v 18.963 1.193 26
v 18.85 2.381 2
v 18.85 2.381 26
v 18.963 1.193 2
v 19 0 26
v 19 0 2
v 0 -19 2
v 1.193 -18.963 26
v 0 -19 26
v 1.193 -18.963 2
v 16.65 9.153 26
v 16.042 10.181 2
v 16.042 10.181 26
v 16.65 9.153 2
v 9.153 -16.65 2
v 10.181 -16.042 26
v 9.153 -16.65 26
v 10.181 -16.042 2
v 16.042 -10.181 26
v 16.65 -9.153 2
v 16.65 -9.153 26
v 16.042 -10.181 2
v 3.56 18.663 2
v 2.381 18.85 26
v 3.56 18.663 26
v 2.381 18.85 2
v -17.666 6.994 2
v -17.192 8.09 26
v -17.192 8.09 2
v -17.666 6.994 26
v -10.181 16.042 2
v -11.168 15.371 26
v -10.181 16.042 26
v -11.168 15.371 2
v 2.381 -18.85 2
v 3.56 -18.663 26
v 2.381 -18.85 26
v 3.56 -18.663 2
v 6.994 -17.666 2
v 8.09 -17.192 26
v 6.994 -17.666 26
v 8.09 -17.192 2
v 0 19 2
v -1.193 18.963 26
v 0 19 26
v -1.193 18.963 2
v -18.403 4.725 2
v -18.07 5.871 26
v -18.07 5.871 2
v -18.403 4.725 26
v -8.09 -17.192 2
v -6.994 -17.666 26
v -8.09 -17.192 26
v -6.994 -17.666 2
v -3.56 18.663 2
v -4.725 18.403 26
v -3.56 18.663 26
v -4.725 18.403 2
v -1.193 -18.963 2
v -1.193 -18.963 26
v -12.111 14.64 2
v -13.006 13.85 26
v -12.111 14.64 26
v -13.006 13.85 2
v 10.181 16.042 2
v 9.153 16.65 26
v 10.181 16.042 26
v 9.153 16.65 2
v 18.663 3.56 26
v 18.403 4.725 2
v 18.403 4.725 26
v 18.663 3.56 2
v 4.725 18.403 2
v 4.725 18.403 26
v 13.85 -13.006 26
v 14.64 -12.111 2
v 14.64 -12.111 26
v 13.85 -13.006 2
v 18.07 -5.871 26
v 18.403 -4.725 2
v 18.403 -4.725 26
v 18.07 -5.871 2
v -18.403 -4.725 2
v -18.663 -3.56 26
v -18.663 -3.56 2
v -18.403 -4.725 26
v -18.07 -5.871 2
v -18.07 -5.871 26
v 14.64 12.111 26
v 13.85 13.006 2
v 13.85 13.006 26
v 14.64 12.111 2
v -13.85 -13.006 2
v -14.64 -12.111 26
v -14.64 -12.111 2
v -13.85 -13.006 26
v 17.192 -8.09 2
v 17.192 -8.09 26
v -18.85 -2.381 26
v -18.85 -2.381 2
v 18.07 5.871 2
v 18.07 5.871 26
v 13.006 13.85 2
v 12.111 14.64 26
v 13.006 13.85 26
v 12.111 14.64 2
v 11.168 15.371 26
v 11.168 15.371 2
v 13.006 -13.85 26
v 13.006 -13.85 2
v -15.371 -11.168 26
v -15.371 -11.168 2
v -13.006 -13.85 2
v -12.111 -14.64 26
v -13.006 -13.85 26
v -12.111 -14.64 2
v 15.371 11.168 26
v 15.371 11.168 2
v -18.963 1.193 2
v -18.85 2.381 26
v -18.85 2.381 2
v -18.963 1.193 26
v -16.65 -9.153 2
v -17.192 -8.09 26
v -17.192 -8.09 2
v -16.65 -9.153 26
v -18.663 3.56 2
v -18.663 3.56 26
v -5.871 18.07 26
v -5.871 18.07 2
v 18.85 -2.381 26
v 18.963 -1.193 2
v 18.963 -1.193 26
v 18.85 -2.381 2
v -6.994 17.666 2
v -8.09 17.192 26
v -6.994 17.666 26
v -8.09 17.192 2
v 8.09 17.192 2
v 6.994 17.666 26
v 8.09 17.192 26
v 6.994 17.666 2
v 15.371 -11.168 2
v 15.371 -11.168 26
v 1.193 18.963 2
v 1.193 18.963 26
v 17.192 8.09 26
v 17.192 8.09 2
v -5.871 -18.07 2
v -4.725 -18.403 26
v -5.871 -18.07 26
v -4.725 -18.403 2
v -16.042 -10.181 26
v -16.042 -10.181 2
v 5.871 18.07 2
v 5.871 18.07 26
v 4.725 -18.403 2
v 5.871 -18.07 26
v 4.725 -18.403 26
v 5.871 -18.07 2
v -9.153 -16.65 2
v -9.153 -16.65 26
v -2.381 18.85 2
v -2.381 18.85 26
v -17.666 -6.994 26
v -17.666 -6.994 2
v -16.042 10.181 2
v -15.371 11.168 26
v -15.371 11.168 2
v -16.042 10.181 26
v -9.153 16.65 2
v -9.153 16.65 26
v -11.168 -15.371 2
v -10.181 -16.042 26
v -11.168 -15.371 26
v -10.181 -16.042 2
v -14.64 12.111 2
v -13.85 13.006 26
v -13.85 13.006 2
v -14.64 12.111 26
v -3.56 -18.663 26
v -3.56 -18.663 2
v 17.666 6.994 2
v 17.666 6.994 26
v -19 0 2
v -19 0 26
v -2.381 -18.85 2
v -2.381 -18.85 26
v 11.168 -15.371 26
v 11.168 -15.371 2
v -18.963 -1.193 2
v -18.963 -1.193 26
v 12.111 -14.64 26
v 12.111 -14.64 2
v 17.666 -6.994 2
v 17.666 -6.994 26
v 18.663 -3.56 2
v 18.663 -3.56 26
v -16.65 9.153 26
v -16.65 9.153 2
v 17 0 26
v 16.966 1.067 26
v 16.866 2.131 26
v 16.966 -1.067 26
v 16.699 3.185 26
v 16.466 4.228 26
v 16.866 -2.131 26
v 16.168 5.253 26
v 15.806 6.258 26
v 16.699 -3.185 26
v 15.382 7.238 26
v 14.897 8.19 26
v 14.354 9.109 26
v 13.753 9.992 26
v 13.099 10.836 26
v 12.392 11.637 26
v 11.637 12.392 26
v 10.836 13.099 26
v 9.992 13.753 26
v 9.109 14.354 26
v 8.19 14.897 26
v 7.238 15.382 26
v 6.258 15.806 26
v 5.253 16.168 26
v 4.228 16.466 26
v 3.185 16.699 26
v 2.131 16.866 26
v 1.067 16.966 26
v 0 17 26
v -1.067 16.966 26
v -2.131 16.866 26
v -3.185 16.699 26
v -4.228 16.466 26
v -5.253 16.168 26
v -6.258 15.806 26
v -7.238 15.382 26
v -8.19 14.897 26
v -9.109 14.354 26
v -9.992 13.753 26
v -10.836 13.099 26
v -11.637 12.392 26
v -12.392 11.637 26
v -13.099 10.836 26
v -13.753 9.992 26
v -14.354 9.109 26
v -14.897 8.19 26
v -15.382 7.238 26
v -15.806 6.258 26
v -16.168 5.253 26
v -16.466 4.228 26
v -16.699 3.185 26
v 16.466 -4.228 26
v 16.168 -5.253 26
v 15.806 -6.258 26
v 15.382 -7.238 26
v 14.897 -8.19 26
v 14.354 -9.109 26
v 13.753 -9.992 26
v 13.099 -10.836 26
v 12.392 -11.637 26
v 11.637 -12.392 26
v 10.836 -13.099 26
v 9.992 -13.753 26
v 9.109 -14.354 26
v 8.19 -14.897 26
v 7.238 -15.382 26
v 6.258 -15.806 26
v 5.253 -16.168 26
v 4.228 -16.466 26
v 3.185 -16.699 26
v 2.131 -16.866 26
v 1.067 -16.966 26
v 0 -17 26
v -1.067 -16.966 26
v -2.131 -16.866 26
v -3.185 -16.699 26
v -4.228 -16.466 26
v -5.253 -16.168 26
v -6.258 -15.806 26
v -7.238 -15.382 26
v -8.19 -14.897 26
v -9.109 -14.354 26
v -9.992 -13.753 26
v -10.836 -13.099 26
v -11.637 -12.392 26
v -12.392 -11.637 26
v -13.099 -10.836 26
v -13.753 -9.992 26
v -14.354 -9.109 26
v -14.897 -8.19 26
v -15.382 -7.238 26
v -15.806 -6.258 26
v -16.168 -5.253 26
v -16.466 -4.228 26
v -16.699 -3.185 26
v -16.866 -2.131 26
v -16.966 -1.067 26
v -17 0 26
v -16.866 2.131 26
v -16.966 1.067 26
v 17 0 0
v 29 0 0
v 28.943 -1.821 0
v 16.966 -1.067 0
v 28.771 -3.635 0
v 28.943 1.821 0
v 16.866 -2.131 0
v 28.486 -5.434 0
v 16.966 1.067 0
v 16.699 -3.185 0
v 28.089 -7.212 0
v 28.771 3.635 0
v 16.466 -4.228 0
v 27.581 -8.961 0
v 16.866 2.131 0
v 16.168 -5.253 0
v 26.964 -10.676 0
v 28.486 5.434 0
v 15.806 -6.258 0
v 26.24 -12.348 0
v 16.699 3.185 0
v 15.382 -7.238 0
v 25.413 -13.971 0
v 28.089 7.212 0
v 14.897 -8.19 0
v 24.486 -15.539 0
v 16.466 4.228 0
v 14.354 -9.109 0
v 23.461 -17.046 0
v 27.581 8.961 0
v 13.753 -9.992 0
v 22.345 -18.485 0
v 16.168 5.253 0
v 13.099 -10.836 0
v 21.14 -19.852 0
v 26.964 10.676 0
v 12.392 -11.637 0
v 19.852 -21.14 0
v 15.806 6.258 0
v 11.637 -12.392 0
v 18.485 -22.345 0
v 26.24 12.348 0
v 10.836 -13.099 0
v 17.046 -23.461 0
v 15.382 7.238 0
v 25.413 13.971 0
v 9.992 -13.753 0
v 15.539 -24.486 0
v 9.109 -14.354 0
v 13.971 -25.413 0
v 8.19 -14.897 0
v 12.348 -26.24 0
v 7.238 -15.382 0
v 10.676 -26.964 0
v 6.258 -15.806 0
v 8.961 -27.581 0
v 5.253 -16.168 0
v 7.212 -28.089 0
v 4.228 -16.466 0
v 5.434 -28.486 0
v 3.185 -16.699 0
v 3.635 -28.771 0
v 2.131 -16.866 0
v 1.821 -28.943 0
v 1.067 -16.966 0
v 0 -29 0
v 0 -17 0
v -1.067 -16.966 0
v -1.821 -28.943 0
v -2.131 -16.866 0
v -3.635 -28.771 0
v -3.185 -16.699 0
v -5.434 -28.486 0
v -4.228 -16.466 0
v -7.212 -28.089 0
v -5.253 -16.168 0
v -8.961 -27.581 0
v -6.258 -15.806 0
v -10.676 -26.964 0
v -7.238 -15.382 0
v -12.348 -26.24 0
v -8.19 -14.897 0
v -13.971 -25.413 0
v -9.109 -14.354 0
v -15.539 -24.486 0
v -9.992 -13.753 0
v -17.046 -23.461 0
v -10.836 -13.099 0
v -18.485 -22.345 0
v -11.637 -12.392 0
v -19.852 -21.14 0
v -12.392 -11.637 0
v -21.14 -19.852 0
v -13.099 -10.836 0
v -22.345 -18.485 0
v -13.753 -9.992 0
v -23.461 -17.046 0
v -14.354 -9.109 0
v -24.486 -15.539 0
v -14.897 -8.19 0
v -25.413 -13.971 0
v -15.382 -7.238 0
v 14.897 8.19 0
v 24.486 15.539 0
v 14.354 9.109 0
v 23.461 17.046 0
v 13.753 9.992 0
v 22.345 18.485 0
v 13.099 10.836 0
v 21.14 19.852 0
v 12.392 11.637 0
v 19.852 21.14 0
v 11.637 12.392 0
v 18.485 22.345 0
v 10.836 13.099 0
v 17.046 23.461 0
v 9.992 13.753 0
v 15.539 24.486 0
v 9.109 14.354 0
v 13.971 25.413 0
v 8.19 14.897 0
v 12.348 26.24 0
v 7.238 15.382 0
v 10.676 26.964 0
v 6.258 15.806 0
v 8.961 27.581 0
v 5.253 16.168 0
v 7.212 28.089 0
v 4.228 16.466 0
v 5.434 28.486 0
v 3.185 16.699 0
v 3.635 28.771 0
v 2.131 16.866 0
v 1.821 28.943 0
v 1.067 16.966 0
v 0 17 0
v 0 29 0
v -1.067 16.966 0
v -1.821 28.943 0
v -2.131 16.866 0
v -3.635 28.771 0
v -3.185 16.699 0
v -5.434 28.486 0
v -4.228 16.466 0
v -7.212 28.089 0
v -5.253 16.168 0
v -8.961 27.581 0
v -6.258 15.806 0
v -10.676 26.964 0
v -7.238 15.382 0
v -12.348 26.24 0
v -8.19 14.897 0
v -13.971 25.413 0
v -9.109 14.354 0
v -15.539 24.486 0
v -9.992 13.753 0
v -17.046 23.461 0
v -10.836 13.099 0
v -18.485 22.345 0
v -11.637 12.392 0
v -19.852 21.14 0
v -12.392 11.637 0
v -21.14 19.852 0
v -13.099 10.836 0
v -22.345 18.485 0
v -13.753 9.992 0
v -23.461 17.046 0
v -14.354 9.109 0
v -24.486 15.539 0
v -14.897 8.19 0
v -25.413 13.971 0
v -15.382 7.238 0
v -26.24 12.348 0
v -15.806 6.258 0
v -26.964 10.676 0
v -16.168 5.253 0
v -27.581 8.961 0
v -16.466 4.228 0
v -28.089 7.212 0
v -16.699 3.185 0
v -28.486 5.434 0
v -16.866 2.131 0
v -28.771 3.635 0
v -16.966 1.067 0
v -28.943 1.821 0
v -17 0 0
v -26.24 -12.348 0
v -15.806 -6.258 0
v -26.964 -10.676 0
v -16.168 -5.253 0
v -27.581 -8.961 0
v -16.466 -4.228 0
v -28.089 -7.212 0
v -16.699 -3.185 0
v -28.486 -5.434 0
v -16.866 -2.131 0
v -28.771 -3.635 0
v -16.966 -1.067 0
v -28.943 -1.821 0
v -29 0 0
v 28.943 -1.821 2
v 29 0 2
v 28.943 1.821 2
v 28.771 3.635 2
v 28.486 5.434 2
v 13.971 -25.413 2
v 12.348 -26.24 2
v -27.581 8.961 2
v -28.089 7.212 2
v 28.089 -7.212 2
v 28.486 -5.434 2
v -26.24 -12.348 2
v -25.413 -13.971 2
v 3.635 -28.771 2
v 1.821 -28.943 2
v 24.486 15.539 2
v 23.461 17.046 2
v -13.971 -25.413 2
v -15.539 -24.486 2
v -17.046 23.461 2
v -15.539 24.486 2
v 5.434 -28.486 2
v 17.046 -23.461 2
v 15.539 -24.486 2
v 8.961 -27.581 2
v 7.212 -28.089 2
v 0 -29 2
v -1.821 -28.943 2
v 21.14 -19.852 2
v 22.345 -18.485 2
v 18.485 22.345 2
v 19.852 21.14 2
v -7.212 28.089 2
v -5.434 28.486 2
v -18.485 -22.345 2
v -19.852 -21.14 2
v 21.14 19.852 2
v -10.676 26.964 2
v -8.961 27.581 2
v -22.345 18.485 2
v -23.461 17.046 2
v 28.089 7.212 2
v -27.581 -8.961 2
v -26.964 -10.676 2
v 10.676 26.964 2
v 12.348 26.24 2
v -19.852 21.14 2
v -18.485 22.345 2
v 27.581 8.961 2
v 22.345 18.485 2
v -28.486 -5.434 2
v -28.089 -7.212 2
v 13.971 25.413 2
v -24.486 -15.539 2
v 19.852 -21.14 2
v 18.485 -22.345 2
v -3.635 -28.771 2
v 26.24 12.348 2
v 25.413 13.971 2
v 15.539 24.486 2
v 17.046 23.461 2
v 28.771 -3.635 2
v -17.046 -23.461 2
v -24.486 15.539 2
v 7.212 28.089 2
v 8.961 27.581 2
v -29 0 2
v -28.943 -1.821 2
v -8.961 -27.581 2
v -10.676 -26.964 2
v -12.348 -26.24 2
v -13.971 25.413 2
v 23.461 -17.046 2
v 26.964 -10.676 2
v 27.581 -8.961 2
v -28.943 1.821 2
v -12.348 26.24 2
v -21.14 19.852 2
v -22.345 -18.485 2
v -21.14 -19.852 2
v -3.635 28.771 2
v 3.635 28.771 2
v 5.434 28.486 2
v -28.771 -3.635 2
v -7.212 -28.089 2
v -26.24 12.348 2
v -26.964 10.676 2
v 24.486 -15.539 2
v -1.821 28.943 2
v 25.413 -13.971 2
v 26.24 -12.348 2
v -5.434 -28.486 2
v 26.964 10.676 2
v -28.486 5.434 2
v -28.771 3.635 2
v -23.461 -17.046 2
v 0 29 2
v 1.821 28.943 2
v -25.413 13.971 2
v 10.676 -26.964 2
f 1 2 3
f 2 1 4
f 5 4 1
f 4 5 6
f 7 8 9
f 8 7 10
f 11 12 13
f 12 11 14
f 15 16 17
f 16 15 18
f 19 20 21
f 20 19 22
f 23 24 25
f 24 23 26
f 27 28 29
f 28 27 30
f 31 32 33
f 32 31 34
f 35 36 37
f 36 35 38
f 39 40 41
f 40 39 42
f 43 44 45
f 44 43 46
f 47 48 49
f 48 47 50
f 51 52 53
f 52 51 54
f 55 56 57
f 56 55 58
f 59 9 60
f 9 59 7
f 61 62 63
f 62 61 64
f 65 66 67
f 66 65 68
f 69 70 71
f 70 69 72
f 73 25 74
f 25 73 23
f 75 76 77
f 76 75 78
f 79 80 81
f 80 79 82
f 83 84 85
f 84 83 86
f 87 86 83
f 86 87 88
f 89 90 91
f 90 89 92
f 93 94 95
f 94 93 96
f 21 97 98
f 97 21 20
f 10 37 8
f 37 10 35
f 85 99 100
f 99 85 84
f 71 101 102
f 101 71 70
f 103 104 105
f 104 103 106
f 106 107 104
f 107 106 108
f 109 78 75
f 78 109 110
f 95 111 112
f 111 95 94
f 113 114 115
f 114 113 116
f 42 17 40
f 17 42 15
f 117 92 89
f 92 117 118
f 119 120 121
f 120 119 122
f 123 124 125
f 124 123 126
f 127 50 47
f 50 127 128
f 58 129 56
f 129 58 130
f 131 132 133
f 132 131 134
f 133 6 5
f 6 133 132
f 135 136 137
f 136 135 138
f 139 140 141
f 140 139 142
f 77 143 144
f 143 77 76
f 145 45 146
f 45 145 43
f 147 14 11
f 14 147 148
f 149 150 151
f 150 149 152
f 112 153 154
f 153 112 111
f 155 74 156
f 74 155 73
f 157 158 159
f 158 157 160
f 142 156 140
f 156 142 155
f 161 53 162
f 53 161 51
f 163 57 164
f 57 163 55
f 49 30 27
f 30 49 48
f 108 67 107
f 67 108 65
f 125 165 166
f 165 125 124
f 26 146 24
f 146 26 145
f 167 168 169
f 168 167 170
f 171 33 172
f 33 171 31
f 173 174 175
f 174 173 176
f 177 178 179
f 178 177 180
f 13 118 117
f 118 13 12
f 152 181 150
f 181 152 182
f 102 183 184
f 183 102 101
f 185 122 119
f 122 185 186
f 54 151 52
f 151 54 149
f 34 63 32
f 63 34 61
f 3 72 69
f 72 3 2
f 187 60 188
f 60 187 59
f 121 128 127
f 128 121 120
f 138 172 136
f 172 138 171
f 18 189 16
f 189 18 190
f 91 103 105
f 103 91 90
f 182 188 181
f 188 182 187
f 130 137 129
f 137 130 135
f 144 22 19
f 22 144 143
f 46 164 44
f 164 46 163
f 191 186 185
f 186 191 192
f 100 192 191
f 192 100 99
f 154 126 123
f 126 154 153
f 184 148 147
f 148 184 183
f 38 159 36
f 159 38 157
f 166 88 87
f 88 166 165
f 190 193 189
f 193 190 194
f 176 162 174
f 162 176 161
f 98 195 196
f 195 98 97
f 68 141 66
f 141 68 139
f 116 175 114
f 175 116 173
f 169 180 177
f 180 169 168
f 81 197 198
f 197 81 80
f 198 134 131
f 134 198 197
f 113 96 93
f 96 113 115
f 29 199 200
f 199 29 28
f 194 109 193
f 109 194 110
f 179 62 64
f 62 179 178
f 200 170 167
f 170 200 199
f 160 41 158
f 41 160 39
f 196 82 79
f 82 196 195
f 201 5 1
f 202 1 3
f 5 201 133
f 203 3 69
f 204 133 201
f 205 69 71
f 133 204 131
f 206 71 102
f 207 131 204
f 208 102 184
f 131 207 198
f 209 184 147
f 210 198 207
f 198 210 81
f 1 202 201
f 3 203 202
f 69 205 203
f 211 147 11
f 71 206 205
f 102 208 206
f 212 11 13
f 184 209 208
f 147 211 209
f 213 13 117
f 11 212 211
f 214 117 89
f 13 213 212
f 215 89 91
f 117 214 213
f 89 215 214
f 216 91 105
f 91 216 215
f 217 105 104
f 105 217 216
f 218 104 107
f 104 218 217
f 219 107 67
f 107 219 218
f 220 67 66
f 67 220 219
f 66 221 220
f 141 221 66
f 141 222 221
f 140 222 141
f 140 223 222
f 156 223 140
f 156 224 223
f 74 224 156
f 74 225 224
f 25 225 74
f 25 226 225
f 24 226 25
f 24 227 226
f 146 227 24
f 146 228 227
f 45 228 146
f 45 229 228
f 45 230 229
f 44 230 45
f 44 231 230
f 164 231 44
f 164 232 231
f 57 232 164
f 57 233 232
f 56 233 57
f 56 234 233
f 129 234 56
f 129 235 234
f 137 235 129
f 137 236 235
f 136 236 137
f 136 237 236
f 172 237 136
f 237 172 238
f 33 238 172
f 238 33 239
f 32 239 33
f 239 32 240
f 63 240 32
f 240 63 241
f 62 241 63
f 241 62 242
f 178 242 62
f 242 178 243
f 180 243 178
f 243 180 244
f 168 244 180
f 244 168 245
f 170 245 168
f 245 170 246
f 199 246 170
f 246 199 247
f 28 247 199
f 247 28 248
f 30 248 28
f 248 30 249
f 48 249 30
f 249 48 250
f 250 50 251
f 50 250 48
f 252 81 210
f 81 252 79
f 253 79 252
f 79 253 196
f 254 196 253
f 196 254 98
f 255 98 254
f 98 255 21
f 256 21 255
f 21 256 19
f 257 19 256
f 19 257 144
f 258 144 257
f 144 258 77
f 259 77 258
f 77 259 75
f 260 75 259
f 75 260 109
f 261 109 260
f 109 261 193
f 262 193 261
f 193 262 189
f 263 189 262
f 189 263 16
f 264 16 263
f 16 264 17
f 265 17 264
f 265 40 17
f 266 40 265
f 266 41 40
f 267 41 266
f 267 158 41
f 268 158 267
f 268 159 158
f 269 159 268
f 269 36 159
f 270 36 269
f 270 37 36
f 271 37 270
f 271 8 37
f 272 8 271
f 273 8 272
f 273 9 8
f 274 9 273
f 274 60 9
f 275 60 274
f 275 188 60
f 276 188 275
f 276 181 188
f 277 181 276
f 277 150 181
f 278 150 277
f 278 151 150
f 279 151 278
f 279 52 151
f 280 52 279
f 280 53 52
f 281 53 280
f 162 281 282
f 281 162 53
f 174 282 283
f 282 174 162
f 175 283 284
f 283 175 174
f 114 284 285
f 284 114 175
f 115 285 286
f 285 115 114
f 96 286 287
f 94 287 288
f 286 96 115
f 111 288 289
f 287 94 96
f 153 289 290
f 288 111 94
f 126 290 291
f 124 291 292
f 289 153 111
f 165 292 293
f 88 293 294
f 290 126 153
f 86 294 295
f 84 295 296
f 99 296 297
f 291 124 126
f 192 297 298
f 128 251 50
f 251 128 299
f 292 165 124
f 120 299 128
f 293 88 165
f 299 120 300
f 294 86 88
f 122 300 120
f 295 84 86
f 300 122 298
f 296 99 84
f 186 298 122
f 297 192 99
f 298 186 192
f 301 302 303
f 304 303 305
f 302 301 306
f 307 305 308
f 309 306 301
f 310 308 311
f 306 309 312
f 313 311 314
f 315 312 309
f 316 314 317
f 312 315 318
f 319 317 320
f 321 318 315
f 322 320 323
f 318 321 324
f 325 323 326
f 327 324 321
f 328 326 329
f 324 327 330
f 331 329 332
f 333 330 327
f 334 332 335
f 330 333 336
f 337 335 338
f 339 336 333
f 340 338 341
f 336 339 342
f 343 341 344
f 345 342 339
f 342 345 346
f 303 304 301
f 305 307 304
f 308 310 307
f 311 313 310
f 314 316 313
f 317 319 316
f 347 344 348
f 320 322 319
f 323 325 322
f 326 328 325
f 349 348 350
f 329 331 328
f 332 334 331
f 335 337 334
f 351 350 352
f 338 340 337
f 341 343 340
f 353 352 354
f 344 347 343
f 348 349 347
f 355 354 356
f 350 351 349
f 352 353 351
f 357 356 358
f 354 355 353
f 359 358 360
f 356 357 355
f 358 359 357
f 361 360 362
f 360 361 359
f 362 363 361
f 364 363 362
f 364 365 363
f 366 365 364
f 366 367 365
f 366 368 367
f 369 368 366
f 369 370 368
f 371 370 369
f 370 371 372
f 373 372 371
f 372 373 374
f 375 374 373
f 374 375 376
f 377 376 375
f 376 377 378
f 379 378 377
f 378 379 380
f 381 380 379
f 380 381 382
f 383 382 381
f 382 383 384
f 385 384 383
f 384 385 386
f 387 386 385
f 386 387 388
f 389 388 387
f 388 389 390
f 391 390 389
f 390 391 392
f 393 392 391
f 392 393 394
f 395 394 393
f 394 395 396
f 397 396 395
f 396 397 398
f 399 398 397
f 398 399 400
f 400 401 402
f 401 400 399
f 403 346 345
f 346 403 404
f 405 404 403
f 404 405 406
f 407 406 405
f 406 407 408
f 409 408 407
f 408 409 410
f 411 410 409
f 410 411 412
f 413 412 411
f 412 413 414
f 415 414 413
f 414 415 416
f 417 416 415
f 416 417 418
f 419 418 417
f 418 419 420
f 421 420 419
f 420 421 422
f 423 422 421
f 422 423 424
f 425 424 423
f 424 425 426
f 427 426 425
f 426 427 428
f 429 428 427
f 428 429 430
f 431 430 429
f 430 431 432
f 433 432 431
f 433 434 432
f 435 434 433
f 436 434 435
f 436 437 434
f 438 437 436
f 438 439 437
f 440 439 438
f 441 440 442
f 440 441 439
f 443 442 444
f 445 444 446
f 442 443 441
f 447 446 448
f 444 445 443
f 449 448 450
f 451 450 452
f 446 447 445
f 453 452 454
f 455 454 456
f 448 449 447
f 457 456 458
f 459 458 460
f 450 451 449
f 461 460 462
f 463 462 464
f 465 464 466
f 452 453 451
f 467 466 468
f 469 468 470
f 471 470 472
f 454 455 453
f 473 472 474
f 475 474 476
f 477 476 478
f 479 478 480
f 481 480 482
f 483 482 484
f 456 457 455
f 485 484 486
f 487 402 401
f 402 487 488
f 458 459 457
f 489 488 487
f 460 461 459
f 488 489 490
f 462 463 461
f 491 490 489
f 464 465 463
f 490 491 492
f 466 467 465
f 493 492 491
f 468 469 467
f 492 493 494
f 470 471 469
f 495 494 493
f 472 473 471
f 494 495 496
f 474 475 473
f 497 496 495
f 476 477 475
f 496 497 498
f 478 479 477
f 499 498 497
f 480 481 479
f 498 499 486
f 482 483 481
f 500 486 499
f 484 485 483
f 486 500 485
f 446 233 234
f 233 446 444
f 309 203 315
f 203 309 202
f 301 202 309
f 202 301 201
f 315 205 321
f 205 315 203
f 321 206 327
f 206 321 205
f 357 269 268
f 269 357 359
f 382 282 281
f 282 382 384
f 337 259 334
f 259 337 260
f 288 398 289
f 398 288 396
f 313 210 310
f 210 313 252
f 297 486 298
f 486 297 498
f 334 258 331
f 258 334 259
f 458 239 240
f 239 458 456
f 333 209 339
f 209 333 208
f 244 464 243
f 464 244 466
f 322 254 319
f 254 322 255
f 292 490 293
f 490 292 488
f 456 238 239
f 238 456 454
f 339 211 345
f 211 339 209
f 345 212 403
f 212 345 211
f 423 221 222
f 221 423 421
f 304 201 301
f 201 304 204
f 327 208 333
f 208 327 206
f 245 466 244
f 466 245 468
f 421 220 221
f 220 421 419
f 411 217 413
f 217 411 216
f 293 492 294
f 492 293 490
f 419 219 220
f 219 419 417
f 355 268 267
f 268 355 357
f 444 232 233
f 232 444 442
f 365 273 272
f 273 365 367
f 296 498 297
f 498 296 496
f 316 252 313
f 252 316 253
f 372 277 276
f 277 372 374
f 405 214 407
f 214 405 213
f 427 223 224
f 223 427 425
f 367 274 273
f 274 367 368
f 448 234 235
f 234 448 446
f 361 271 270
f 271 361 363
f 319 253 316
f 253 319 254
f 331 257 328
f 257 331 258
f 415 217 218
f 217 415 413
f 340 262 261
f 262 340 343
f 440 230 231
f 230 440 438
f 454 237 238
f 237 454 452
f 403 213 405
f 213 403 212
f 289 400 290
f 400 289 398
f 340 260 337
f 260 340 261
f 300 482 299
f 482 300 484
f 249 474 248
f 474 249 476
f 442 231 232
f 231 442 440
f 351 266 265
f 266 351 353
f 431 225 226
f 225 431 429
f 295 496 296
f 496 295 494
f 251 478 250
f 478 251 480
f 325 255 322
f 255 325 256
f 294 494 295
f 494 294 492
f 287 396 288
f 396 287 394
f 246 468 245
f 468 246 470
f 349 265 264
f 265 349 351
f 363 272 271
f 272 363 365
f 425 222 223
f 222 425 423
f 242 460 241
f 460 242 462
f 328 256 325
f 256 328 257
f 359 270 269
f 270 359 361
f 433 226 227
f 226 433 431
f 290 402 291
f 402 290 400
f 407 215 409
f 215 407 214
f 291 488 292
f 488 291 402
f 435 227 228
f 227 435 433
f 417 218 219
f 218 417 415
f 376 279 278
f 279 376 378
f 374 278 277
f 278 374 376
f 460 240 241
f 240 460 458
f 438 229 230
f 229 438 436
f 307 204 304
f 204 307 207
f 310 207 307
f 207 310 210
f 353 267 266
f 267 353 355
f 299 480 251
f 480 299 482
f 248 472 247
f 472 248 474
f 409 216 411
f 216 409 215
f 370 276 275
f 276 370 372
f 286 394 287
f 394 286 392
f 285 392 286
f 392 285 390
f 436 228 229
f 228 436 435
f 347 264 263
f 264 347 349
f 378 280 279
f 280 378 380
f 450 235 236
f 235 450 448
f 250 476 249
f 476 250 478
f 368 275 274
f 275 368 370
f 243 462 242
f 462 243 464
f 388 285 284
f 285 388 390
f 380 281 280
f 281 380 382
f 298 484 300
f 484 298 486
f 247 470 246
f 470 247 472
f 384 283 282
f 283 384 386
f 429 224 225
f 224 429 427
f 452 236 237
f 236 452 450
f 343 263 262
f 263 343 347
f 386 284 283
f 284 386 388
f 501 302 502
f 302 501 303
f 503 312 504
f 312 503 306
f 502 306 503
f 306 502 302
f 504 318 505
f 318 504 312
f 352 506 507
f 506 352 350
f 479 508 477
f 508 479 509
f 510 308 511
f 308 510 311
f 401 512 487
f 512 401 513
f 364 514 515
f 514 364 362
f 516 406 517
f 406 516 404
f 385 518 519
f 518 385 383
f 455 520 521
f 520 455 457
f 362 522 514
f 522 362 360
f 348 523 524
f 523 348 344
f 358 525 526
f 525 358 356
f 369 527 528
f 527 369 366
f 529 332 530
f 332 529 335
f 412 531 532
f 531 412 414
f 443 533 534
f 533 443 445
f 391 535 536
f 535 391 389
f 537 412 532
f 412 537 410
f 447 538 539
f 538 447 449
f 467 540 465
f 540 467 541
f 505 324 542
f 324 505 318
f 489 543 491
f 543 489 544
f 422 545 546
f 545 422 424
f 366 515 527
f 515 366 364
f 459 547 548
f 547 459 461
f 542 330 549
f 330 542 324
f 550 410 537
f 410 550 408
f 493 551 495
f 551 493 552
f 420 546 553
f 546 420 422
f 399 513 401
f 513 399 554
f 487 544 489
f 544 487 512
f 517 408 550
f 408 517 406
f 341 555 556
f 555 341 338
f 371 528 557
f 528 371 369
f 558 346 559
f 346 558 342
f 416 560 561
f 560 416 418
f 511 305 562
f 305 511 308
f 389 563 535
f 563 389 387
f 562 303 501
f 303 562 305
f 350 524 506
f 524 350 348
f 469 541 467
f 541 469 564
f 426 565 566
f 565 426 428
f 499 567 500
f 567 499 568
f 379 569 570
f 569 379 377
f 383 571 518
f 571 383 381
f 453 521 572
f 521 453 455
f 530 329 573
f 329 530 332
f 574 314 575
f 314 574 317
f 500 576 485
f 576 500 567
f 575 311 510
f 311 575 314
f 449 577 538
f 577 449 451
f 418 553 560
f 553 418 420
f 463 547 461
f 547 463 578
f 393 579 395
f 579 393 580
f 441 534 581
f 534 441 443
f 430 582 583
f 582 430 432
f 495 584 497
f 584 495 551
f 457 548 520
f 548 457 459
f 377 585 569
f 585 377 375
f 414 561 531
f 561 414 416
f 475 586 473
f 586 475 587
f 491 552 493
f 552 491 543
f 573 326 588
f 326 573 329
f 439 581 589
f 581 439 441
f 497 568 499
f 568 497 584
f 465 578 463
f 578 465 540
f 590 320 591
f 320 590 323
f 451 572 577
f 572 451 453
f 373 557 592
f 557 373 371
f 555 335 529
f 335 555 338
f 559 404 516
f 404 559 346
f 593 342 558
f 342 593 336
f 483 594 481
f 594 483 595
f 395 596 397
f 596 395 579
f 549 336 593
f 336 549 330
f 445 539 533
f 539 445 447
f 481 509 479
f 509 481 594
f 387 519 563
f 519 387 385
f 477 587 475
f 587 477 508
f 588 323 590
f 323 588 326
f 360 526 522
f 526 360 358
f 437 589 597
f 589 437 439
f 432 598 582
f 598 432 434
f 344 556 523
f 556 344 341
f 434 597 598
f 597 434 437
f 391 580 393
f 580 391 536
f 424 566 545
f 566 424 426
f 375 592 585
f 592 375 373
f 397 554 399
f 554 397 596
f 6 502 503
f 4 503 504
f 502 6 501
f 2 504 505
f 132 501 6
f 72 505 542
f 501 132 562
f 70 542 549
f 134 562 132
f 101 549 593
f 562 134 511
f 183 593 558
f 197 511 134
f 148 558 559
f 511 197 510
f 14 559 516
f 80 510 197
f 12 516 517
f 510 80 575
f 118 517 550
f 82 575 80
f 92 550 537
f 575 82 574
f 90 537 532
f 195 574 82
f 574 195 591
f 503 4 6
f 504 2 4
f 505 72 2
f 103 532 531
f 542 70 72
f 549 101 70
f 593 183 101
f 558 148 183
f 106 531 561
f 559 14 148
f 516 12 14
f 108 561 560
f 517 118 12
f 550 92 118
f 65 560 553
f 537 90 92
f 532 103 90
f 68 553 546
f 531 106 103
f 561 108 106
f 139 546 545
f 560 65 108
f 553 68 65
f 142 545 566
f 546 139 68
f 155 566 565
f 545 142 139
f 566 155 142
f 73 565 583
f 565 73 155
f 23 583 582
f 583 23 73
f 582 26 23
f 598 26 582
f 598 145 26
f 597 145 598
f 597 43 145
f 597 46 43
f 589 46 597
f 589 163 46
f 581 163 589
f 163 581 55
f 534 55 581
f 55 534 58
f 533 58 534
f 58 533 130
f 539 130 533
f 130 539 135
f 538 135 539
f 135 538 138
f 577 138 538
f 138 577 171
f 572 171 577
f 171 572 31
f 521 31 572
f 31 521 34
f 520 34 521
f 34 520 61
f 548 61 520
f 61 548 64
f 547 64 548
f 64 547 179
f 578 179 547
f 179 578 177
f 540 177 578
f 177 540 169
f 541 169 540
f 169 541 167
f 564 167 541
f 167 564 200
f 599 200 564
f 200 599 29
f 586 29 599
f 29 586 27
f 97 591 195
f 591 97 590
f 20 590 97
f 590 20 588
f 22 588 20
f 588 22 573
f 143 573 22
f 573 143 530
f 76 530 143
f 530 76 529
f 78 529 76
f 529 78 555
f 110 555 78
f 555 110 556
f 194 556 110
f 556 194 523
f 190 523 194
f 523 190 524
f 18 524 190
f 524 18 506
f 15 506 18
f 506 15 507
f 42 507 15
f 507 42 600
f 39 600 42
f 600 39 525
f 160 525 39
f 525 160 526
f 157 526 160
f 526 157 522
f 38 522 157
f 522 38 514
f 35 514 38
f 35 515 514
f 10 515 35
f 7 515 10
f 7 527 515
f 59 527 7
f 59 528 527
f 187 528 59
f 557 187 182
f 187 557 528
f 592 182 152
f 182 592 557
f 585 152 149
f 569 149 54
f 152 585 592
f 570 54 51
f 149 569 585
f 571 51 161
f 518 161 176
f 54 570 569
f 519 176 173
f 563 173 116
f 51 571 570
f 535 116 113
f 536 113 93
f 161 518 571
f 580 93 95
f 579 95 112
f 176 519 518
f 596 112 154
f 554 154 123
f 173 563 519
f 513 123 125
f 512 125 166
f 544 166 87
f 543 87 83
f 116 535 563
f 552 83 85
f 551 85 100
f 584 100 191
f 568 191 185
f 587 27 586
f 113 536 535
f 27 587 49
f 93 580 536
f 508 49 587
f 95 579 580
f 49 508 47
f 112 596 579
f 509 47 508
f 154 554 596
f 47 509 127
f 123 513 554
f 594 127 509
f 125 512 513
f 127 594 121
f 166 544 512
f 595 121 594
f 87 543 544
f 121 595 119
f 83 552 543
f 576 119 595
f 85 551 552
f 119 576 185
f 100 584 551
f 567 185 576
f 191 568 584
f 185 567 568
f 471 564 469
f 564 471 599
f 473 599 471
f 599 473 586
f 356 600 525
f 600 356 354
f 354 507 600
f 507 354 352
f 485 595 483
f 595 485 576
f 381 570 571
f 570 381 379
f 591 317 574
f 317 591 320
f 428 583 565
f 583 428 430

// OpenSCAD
// 9v battery battery box
//34567891123456789212345678931234567894123456789512345678961234567897123456789
$fn = 100;

insideD = 34.0;
wallSize = 2.0;
outsideD = insideD + 2*wallSize;
flangeD = outsideD + 10*wallSize;

module PvcCoupler(h=26, d=34.0, fd=45.0, ws=2) {
    union() {
        difference() {
            cylinder(h=h, d=d+2*ws, center=false);
            translate([0,0,-0.001/2])
                cylinder(h=h+0.001, d=d, center=false);
        }
        difference() {
            cylinder(h=ws, d=fd, center=false);
            translate([0,0,-0.001/2])
                cylinder(h=ws+0.001, d=d+2*ws-0.001, center=false);
        }
    }
}

PvcCoupler(d=insideD, ws=2, fd=flangeD);
